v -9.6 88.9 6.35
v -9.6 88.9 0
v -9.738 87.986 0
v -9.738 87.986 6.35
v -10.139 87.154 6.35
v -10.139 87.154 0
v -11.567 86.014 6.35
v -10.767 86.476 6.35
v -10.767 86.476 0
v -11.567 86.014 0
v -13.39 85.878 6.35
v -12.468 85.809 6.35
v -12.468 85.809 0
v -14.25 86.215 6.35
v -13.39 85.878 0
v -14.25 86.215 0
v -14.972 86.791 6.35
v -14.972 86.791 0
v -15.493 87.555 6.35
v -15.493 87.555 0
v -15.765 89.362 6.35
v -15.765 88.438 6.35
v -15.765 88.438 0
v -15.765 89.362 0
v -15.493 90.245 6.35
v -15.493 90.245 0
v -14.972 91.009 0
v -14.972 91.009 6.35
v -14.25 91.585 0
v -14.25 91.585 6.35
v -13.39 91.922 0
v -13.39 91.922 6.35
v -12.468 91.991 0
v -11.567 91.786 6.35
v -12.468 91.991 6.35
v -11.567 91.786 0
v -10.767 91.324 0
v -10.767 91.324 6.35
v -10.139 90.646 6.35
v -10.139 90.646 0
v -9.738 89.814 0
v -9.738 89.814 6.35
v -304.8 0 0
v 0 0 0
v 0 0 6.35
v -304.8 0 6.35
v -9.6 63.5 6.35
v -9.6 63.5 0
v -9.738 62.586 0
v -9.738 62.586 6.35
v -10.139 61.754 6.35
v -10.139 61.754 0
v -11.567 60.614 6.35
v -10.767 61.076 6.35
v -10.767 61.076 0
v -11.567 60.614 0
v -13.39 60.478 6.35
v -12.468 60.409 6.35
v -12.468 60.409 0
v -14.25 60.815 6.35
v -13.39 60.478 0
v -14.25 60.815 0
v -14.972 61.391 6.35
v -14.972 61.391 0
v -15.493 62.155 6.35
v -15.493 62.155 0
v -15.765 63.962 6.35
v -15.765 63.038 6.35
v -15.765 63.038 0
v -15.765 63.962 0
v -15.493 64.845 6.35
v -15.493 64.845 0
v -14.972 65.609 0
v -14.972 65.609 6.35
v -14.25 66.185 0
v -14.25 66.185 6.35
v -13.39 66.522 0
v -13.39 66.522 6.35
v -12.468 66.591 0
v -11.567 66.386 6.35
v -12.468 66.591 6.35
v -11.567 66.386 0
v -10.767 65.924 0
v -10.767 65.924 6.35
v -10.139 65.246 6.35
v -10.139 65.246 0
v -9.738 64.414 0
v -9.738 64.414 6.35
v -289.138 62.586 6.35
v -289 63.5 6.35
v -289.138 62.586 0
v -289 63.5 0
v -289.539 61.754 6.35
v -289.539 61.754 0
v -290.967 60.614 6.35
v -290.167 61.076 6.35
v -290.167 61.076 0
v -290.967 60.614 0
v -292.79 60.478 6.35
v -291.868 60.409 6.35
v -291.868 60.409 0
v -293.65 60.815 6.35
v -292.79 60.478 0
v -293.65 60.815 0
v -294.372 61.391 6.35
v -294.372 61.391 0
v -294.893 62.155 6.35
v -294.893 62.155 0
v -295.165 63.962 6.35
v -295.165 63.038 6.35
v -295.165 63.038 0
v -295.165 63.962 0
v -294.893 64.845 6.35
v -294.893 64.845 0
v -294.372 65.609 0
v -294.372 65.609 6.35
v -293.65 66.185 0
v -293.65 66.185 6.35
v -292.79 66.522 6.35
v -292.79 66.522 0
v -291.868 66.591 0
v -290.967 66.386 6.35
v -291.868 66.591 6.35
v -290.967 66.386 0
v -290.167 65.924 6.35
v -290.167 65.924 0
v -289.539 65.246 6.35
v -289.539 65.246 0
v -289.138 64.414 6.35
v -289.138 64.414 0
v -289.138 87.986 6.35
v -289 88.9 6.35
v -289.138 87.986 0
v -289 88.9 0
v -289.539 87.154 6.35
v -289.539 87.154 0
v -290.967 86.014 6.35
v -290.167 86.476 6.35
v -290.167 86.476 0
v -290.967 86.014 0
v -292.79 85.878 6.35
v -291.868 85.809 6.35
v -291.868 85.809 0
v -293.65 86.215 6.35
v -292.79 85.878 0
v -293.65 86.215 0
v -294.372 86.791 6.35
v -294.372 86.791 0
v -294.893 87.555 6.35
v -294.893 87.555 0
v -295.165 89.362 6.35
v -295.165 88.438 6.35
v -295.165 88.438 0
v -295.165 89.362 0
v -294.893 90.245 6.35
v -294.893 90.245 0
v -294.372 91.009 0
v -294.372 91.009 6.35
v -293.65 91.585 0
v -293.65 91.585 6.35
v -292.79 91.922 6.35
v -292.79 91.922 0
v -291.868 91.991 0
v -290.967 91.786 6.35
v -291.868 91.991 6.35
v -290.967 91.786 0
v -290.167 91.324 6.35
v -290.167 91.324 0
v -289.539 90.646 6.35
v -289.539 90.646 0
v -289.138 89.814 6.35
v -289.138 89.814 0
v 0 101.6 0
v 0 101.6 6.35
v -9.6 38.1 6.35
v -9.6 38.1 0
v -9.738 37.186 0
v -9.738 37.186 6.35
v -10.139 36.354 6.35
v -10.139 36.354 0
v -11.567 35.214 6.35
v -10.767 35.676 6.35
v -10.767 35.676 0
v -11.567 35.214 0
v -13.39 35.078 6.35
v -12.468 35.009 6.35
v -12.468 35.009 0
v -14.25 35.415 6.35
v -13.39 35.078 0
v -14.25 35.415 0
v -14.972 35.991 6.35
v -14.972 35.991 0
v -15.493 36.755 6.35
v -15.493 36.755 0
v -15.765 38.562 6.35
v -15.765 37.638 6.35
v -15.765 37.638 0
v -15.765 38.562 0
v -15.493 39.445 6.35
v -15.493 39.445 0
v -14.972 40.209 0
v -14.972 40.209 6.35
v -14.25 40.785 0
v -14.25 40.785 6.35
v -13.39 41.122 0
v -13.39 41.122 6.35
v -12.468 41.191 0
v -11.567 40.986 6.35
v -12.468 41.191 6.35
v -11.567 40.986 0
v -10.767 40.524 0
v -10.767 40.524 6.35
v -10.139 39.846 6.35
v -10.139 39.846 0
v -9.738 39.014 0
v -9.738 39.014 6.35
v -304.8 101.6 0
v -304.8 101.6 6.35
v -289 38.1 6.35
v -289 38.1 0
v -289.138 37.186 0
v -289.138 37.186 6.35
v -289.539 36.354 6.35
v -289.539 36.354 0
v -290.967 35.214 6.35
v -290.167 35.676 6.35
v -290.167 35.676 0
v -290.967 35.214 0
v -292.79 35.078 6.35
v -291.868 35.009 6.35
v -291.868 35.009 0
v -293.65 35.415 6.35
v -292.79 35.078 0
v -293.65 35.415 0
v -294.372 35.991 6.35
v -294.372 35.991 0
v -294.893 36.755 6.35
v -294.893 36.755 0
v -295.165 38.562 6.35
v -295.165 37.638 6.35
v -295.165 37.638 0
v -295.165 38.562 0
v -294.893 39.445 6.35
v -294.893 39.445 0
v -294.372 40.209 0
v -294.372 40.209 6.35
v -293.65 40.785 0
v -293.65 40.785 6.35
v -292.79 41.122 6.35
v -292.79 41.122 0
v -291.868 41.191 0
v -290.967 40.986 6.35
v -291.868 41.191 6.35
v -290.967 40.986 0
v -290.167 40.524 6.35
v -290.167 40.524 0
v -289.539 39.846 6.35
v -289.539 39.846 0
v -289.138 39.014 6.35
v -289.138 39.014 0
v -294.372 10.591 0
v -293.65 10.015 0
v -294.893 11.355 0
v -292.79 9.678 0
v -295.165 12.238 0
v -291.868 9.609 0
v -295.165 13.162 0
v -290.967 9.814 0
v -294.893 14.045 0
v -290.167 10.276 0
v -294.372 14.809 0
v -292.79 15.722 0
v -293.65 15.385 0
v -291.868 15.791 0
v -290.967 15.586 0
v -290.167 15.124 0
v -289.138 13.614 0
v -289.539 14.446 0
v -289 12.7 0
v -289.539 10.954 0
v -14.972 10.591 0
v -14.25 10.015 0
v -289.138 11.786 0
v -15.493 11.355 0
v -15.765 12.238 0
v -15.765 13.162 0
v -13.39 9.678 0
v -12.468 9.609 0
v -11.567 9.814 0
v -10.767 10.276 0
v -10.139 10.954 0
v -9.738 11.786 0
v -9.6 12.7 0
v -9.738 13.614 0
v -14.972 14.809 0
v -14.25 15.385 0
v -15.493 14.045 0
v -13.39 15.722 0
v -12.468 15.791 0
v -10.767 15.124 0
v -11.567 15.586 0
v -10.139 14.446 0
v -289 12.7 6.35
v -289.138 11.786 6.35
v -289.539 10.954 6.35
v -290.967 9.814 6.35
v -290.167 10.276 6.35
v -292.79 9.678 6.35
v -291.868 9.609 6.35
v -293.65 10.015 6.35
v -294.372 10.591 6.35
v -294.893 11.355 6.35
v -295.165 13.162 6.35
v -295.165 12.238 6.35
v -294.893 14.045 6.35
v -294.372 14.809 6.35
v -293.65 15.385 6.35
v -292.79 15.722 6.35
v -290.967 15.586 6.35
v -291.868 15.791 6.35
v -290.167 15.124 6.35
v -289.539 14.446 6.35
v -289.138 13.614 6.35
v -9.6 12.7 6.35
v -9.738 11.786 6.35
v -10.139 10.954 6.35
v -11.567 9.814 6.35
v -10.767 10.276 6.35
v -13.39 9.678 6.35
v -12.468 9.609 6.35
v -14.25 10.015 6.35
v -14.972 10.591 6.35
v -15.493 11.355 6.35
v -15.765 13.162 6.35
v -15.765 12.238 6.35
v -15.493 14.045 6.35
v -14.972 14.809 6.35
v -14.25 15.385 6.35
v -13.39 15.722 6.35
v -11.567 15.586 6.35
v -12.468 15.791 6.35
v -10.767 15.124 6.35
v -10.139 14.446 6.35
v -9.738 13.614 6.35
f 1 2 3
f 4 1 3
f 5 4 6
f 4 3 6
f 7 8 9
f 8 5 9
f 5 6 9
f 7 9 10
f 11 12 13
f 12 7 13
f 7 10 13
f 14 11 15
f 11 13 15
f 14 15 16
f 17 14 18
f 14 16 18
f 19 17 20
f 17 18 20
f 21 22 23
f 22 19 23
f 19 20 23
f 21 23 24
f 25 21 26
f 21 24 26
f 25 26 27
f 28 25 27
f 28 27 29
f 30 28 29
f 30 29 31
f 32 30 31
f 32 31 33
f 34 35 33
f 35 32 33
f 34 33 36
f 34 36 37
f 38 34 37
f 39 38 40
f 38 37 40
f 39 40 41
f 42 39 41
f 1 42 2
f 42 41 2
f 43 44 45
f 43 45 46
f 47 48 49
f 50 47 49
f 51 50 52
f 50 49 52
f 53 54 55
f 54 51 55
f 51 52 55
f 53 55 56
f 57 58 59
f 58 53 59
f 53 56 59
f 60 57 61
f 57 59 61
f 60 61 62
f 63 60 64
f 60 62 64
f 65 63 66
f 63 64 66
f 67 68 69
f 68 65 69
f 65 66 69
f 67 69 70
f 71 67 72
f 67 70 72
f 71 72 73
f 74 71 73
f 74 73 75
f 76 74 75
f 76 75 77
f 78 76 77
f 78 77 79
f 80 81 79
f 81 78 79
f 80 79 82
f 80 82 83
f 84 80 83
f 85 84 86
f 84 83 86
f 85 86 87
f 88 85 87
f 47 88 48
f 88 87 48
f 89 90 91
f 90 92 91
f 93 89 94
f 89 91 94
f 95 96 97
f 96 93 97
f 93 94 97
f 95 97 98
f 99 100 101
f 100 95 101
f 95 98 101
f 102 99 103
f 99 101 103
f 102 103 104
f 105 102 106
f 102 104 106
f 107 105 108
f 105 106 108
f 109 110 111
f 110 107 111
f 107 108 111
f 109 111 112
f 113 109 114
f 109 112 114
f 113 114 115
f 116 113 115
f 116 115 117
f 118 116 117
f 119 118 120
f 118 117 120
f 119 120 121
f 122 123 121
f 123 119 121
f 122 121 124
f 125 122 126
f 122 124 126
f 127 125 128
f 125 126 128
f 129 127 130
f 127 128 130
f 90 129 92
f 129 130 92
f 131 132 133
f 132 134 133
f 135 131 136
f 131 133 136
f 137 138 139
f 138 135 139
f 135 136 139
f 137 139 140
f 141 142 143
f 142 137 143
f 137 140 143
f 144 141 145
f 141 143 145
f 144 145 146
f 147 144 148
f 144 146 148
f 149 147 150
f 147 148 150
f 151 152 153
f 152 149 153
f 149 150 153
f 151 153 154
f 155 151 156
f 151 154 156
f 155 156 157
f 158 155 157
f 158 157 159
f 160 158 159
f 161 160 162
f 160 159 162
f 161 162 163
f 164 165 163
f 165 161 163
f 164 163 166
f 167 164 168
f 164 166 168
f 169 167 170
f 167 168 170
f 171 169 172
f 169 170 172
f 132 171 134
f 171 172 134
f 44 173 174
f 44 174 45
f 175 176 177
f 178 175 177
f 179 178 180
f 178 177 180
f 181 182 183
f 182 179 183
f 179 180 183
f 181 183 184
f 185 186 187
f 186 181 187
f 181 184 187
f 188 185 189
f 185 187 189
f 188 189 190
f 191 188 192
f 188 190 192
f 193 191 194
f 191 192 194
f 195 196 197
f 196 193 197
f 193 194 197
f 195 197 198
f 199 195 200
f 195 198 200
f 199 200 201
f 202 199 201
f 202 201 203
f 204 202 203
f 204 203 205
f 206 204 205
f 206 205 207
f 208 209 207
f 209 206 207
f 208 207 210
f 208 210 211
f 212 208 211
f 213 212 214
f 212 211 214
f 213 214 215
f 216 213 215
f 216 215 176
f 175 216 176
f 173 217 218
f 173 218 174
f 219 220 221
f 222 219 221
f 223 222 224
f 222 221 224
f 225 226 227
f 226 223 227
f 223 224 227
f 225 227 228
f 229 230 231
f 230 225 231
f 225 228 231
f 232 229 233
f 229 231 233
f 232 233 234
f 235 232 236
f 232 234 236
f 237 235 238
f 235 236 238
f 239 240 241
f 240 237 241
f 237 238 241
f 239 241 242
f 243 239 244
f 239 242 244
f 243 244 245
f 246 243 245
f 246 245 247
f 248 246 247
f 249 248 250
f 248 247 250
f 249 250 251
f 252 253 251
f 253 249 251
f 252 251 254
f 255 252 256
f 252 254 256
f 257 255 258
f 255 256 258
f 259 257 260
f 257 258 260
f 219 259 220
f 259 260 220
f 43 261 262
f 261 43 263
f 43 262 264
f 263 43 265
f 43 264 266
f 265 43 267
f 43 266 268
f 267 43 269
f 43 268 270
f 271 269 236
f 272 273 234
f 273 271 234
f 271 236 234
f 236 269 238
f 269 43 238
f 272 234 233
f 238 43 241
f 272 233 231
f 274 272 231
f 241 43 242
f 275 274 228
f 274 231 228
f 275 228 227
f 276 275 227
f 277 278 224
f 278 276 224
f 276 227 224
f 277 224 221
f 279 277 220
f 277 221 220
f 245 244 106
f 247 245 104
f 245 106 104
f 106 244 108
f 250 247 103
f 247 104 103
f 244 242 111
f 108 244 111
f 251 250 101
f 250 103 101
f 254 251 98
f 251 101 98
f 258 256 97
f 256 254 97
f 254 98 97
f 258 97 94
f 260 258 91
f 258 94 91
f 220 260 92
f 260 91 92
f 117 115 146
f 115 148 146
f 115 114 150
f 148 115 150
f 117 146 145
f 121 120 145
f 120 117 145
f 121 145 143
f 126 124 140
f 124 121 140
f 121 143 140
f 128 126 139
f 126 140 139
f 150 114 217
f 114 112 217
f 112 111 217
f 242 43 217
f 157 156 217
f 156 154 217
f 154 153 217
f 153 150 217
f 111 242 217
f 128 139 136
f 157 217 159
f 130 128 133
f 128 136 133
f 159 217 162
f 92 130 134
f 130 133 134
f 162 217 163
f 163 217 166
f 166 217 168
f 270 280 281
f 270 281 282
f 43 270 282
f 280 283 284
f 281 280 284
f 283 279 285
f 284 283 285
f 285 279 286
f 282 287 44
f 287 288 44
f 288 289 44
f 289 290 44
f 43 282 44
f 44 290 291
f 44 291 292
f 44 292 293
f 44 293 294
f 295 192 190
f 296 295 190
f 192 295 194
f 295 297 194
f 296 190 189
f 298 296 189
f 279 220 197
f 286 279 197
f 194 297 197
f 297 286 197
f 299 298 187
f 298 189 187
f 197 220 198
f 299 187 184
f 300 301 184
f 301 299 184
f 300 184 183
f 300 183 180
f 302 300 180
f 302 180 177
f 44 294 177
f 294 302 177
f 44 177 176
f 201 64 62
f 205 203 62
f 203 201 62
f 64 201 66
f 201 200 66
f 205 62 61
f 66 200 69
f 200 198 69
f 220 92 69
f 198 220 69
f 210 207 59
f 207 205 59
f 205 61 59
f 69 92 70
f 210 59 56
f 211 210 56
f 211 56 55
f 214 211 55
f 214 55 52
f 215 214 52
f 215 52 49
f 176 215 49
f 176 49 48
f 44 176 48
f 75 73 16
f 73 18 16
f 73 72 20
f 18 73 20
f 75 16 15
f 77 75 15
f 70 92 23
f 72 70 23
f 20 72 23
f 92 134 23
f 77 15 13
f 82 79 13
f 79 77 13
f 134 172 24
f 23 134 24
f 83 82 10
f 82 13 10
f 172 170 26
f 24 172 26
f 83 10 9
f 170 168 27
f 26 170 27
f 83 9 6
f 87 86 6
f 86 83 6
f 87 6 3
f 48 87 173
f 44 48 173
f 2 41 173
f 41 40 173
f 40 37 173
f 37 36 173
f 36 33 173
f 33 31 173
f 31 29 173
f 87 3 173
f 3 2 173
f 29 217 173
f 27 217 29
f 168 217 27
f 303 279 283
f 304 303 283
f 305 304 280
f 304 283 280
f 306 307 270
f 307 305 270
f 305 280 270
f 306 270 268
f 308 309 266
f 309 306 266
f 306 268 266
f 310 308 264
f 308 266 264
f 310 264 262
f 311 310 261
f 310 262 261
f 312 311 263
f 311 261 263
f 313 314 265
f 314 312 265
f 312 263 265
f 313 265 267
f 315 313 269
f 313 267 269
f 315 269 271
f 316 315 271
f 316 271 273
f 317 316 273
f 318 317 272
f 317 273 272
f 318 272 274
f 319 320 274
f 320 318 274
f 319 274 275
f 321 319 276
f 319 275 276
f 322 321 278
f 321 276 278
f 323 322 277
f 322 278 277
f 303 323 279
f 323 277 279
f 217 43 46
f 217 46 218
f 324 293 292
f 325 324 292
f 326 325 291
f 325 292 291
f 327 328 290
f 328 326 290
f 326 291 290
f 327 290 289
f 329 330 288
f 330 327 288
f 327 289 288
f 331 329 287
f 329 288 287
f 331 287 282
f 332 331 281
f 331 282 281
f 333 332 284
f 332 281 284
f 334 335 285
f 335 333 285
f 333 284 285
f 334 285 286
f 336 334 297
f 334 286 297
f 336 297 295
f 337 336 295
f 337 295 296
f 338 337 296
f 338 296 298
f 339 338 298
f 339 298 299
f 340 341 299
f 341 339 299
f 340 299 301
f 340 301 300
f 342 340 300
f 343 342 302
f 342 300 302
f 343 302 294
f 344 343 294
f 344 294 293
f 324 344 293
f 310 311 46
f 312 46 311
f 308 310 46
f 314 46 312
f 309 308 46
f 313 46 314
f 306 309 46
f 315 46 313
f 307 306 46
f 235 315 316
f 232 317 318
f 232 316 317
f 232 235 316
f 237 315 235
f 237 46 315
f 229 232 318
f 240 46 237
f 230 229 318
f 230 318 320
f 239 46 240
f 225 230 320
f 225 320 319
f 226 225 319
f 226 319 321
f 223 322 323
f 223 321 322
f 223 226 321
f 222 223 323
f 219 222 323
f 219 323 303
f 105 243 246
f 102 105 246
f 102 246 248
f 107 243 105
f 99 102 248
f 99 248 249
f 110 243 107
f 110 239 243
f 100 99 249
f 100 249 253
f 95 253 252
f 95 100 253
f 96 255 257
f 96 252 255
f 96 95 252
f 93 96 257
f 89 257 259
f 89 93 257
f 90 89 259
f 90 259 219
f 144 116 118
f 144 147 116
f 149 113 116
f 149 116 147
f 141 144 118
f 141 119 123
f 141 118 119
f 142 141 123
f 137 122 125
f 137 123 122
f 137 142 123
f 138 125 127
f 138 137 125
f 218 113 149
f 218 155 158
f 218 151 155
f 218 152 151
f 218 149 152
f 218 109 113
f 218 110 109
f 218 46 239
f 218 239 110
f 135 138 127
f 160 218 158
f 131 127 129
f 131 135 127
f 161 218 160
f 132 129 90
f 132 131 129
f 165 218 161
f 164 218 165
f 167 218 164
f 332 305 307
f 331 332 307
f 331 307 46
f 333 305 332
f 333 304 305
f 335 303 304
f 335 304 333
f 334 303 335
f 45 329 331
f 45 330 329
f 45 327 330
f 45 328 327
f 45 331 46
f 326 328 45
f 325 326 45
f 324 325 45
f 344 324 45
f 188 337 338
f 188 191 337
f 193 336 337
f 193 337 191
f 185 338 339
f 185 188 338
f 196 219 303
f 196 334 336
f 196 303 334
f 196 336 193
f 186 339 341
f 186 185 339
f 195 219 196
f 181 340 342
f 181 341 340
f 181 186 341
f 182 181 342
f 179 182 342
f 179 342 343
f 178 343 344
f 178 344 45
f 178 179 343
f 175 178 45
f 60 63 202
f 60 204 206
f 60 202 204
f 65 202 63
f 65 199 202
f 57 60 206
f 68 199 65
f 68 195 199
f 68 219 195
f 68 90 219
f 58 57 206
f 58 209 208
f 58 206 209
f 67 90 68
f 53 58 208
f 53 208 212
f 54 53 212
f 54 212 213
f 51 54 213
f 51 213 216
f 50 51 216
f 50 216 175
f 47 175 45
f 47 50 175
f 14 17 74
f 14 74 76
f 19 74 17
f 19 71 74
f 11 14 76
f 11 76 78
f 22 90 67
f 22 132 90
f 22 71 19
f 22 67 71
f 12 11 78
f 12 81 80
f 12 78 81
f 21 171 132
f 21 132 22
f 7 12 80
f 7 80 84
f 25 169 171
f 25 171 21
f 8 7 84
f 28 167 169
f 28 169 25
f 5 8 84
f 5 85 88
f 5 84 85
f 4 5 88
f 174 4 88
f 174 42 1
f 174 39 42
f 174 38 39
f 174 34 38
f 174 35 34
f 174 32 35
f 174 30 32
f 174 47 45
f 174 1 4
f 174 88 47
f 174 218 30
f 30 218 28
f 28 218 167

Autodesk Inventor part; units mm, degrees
ref_plane "YZ Plane" through (0, 0, 0) normal (1, 0, 0) x (0, 1, 0)
ref_plane "XZ Plane" through (0, 0, 0) normal (0, 1, 0) x (-1, 0, 0)
ref_plane "XY Plane" through (0, 0, 0) normal (0, 0, 1) x (1, 0, 0)
sketch "Sketch1" plane through (0, 0, 0) normal (0, 0, 1) x (1, 0, 0)
  line L0 (0, 0) -> (-304.8, 0)
  line L1 (-304.8, 0) -> (-304.8, 101.6)
  line L2 (-304.8, 101.6) -> (0, 101.6)
  line L3 (0, 101.6) -> (0, 0)
  circle A0 centre (-292.1, 88.9) radius 3.1
  circle A1 centre (-292.1, 63.5) radius 3.1
  circle A2 centre (-292.1, 38.1) radius 3.1
  circle A3 centre (-292.1, 12.7) radius 3.1
  line L4 (-152.4, 101.6) -> (-152.4, 63.5) construction
  circle A4 centre (-12.7, 88.9) radius 3.1
  circle A5 centre (-12.7, 63.5) radius 3.1
  circle A6 centre (-12.7, 38.1) radius 3.1
  circle A7 centre (-12.7, 12.7) radius 3.1
  dimension "d0" = 304.8
  dimension "d1" = 101.6
  dimension "d2" = 6.2
  dimension "d3" = 12.7
  dimension "d4" = 12.7
  dimension "d7" = 25.4
extrude "Extrusion1" add sketch "Sketch1" along normal blind 6.35
properties part number "shortsides"
